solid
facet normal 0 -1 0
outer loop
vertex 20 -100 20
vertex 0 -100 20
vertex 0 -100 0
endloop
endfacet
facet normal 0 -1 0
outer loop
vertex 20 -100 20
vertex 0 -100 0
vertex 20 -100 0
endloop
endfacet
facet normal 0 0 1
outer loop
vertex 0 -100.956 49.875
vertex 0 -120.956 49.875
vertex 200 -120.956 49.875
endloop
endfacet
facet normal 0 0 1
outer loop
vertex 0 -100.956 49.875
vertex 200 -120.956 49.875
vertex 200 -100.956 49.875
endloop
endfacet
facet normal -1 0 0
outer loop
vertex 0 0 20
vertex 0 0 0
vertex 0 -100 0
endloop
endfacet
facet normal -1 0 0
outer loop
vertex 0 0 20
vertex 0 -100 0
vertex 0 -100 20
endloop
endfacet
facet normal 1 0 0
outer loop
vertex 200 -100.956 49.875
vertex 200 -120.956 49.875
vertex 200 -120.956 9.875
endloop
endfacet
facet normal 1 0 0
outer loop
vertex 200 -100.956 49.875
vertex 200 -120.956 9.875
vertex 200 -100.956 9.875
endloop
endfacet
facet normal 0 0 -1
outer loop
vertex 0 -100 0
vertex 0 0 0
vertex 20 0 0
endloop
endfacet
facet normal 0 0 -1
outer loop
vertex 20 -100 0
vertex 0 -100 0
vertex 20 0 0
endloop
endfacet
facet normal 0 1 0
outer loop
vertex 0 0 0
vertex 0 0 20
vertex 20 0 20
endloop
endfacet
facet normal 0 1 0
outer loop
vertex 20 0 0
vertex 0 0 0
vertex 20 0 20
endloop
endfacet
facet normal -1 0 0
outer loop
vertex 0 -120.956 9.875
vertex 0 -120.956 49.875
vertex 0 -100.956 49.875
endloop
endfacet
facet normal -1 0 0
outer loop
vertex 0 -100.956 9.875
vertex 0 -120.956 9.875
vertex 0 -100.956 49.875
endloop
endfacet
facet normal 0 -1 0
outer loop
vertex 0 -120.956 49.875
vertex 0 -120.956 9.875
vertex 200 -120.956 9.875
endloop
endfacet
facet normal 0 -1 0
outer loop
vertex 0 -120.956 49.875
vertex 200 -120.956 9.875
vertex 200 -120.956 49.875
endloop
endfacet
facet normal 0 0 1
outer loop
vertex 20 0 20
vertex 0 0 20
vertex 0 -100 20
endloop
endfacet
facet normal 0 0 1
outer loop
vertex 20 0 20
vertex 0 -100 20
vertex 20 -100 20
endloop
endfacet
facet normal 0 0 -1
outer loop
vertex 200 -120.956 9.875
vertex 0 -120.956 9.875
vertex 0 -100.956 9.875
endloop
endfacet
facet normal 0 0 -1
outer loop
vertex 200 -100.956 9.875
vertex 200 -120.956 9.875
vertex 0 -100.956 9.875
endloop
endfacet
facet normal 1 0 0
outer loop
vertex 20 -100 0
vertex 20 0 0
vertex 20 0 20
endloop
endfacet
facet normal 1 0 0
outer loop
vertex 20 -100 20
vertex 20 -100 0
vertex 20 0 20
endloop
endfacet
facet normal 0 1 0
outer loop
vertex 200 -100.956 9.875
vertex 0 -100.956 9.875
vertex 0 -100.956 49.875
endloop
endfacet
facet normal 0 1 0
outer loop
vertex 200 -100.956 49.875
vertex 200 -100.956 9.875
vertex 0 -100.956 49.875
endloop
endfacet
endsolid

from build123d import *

# Parameters (mm, degrees)
F0_W     = 20
F0_H     = 20
F1_DEPTH = 100
F2_W     = 20
F2_H     = 40
F3_DEPTH = 200


with BuildPart() as f1:
    # F0 (on Front) → F1 (new body)
    with BuildSketch(Plane.XZ):
        with Locations((10, 10)):
            Rectangle(F0_W, F0_H)
    extrude(amount=F1_DEPTH)


with BuildPart() as f3:
    # F2 (on Right) → F3 (new body)
    with BuildSketch(Plane.YZ):
        with Locations((-110.956088, 29.875441)):
            Rectangle(F2_W, F2_H)
    extrude(amount=F3_DEPTH)


solid = Compound([f1.part, f3.part])
